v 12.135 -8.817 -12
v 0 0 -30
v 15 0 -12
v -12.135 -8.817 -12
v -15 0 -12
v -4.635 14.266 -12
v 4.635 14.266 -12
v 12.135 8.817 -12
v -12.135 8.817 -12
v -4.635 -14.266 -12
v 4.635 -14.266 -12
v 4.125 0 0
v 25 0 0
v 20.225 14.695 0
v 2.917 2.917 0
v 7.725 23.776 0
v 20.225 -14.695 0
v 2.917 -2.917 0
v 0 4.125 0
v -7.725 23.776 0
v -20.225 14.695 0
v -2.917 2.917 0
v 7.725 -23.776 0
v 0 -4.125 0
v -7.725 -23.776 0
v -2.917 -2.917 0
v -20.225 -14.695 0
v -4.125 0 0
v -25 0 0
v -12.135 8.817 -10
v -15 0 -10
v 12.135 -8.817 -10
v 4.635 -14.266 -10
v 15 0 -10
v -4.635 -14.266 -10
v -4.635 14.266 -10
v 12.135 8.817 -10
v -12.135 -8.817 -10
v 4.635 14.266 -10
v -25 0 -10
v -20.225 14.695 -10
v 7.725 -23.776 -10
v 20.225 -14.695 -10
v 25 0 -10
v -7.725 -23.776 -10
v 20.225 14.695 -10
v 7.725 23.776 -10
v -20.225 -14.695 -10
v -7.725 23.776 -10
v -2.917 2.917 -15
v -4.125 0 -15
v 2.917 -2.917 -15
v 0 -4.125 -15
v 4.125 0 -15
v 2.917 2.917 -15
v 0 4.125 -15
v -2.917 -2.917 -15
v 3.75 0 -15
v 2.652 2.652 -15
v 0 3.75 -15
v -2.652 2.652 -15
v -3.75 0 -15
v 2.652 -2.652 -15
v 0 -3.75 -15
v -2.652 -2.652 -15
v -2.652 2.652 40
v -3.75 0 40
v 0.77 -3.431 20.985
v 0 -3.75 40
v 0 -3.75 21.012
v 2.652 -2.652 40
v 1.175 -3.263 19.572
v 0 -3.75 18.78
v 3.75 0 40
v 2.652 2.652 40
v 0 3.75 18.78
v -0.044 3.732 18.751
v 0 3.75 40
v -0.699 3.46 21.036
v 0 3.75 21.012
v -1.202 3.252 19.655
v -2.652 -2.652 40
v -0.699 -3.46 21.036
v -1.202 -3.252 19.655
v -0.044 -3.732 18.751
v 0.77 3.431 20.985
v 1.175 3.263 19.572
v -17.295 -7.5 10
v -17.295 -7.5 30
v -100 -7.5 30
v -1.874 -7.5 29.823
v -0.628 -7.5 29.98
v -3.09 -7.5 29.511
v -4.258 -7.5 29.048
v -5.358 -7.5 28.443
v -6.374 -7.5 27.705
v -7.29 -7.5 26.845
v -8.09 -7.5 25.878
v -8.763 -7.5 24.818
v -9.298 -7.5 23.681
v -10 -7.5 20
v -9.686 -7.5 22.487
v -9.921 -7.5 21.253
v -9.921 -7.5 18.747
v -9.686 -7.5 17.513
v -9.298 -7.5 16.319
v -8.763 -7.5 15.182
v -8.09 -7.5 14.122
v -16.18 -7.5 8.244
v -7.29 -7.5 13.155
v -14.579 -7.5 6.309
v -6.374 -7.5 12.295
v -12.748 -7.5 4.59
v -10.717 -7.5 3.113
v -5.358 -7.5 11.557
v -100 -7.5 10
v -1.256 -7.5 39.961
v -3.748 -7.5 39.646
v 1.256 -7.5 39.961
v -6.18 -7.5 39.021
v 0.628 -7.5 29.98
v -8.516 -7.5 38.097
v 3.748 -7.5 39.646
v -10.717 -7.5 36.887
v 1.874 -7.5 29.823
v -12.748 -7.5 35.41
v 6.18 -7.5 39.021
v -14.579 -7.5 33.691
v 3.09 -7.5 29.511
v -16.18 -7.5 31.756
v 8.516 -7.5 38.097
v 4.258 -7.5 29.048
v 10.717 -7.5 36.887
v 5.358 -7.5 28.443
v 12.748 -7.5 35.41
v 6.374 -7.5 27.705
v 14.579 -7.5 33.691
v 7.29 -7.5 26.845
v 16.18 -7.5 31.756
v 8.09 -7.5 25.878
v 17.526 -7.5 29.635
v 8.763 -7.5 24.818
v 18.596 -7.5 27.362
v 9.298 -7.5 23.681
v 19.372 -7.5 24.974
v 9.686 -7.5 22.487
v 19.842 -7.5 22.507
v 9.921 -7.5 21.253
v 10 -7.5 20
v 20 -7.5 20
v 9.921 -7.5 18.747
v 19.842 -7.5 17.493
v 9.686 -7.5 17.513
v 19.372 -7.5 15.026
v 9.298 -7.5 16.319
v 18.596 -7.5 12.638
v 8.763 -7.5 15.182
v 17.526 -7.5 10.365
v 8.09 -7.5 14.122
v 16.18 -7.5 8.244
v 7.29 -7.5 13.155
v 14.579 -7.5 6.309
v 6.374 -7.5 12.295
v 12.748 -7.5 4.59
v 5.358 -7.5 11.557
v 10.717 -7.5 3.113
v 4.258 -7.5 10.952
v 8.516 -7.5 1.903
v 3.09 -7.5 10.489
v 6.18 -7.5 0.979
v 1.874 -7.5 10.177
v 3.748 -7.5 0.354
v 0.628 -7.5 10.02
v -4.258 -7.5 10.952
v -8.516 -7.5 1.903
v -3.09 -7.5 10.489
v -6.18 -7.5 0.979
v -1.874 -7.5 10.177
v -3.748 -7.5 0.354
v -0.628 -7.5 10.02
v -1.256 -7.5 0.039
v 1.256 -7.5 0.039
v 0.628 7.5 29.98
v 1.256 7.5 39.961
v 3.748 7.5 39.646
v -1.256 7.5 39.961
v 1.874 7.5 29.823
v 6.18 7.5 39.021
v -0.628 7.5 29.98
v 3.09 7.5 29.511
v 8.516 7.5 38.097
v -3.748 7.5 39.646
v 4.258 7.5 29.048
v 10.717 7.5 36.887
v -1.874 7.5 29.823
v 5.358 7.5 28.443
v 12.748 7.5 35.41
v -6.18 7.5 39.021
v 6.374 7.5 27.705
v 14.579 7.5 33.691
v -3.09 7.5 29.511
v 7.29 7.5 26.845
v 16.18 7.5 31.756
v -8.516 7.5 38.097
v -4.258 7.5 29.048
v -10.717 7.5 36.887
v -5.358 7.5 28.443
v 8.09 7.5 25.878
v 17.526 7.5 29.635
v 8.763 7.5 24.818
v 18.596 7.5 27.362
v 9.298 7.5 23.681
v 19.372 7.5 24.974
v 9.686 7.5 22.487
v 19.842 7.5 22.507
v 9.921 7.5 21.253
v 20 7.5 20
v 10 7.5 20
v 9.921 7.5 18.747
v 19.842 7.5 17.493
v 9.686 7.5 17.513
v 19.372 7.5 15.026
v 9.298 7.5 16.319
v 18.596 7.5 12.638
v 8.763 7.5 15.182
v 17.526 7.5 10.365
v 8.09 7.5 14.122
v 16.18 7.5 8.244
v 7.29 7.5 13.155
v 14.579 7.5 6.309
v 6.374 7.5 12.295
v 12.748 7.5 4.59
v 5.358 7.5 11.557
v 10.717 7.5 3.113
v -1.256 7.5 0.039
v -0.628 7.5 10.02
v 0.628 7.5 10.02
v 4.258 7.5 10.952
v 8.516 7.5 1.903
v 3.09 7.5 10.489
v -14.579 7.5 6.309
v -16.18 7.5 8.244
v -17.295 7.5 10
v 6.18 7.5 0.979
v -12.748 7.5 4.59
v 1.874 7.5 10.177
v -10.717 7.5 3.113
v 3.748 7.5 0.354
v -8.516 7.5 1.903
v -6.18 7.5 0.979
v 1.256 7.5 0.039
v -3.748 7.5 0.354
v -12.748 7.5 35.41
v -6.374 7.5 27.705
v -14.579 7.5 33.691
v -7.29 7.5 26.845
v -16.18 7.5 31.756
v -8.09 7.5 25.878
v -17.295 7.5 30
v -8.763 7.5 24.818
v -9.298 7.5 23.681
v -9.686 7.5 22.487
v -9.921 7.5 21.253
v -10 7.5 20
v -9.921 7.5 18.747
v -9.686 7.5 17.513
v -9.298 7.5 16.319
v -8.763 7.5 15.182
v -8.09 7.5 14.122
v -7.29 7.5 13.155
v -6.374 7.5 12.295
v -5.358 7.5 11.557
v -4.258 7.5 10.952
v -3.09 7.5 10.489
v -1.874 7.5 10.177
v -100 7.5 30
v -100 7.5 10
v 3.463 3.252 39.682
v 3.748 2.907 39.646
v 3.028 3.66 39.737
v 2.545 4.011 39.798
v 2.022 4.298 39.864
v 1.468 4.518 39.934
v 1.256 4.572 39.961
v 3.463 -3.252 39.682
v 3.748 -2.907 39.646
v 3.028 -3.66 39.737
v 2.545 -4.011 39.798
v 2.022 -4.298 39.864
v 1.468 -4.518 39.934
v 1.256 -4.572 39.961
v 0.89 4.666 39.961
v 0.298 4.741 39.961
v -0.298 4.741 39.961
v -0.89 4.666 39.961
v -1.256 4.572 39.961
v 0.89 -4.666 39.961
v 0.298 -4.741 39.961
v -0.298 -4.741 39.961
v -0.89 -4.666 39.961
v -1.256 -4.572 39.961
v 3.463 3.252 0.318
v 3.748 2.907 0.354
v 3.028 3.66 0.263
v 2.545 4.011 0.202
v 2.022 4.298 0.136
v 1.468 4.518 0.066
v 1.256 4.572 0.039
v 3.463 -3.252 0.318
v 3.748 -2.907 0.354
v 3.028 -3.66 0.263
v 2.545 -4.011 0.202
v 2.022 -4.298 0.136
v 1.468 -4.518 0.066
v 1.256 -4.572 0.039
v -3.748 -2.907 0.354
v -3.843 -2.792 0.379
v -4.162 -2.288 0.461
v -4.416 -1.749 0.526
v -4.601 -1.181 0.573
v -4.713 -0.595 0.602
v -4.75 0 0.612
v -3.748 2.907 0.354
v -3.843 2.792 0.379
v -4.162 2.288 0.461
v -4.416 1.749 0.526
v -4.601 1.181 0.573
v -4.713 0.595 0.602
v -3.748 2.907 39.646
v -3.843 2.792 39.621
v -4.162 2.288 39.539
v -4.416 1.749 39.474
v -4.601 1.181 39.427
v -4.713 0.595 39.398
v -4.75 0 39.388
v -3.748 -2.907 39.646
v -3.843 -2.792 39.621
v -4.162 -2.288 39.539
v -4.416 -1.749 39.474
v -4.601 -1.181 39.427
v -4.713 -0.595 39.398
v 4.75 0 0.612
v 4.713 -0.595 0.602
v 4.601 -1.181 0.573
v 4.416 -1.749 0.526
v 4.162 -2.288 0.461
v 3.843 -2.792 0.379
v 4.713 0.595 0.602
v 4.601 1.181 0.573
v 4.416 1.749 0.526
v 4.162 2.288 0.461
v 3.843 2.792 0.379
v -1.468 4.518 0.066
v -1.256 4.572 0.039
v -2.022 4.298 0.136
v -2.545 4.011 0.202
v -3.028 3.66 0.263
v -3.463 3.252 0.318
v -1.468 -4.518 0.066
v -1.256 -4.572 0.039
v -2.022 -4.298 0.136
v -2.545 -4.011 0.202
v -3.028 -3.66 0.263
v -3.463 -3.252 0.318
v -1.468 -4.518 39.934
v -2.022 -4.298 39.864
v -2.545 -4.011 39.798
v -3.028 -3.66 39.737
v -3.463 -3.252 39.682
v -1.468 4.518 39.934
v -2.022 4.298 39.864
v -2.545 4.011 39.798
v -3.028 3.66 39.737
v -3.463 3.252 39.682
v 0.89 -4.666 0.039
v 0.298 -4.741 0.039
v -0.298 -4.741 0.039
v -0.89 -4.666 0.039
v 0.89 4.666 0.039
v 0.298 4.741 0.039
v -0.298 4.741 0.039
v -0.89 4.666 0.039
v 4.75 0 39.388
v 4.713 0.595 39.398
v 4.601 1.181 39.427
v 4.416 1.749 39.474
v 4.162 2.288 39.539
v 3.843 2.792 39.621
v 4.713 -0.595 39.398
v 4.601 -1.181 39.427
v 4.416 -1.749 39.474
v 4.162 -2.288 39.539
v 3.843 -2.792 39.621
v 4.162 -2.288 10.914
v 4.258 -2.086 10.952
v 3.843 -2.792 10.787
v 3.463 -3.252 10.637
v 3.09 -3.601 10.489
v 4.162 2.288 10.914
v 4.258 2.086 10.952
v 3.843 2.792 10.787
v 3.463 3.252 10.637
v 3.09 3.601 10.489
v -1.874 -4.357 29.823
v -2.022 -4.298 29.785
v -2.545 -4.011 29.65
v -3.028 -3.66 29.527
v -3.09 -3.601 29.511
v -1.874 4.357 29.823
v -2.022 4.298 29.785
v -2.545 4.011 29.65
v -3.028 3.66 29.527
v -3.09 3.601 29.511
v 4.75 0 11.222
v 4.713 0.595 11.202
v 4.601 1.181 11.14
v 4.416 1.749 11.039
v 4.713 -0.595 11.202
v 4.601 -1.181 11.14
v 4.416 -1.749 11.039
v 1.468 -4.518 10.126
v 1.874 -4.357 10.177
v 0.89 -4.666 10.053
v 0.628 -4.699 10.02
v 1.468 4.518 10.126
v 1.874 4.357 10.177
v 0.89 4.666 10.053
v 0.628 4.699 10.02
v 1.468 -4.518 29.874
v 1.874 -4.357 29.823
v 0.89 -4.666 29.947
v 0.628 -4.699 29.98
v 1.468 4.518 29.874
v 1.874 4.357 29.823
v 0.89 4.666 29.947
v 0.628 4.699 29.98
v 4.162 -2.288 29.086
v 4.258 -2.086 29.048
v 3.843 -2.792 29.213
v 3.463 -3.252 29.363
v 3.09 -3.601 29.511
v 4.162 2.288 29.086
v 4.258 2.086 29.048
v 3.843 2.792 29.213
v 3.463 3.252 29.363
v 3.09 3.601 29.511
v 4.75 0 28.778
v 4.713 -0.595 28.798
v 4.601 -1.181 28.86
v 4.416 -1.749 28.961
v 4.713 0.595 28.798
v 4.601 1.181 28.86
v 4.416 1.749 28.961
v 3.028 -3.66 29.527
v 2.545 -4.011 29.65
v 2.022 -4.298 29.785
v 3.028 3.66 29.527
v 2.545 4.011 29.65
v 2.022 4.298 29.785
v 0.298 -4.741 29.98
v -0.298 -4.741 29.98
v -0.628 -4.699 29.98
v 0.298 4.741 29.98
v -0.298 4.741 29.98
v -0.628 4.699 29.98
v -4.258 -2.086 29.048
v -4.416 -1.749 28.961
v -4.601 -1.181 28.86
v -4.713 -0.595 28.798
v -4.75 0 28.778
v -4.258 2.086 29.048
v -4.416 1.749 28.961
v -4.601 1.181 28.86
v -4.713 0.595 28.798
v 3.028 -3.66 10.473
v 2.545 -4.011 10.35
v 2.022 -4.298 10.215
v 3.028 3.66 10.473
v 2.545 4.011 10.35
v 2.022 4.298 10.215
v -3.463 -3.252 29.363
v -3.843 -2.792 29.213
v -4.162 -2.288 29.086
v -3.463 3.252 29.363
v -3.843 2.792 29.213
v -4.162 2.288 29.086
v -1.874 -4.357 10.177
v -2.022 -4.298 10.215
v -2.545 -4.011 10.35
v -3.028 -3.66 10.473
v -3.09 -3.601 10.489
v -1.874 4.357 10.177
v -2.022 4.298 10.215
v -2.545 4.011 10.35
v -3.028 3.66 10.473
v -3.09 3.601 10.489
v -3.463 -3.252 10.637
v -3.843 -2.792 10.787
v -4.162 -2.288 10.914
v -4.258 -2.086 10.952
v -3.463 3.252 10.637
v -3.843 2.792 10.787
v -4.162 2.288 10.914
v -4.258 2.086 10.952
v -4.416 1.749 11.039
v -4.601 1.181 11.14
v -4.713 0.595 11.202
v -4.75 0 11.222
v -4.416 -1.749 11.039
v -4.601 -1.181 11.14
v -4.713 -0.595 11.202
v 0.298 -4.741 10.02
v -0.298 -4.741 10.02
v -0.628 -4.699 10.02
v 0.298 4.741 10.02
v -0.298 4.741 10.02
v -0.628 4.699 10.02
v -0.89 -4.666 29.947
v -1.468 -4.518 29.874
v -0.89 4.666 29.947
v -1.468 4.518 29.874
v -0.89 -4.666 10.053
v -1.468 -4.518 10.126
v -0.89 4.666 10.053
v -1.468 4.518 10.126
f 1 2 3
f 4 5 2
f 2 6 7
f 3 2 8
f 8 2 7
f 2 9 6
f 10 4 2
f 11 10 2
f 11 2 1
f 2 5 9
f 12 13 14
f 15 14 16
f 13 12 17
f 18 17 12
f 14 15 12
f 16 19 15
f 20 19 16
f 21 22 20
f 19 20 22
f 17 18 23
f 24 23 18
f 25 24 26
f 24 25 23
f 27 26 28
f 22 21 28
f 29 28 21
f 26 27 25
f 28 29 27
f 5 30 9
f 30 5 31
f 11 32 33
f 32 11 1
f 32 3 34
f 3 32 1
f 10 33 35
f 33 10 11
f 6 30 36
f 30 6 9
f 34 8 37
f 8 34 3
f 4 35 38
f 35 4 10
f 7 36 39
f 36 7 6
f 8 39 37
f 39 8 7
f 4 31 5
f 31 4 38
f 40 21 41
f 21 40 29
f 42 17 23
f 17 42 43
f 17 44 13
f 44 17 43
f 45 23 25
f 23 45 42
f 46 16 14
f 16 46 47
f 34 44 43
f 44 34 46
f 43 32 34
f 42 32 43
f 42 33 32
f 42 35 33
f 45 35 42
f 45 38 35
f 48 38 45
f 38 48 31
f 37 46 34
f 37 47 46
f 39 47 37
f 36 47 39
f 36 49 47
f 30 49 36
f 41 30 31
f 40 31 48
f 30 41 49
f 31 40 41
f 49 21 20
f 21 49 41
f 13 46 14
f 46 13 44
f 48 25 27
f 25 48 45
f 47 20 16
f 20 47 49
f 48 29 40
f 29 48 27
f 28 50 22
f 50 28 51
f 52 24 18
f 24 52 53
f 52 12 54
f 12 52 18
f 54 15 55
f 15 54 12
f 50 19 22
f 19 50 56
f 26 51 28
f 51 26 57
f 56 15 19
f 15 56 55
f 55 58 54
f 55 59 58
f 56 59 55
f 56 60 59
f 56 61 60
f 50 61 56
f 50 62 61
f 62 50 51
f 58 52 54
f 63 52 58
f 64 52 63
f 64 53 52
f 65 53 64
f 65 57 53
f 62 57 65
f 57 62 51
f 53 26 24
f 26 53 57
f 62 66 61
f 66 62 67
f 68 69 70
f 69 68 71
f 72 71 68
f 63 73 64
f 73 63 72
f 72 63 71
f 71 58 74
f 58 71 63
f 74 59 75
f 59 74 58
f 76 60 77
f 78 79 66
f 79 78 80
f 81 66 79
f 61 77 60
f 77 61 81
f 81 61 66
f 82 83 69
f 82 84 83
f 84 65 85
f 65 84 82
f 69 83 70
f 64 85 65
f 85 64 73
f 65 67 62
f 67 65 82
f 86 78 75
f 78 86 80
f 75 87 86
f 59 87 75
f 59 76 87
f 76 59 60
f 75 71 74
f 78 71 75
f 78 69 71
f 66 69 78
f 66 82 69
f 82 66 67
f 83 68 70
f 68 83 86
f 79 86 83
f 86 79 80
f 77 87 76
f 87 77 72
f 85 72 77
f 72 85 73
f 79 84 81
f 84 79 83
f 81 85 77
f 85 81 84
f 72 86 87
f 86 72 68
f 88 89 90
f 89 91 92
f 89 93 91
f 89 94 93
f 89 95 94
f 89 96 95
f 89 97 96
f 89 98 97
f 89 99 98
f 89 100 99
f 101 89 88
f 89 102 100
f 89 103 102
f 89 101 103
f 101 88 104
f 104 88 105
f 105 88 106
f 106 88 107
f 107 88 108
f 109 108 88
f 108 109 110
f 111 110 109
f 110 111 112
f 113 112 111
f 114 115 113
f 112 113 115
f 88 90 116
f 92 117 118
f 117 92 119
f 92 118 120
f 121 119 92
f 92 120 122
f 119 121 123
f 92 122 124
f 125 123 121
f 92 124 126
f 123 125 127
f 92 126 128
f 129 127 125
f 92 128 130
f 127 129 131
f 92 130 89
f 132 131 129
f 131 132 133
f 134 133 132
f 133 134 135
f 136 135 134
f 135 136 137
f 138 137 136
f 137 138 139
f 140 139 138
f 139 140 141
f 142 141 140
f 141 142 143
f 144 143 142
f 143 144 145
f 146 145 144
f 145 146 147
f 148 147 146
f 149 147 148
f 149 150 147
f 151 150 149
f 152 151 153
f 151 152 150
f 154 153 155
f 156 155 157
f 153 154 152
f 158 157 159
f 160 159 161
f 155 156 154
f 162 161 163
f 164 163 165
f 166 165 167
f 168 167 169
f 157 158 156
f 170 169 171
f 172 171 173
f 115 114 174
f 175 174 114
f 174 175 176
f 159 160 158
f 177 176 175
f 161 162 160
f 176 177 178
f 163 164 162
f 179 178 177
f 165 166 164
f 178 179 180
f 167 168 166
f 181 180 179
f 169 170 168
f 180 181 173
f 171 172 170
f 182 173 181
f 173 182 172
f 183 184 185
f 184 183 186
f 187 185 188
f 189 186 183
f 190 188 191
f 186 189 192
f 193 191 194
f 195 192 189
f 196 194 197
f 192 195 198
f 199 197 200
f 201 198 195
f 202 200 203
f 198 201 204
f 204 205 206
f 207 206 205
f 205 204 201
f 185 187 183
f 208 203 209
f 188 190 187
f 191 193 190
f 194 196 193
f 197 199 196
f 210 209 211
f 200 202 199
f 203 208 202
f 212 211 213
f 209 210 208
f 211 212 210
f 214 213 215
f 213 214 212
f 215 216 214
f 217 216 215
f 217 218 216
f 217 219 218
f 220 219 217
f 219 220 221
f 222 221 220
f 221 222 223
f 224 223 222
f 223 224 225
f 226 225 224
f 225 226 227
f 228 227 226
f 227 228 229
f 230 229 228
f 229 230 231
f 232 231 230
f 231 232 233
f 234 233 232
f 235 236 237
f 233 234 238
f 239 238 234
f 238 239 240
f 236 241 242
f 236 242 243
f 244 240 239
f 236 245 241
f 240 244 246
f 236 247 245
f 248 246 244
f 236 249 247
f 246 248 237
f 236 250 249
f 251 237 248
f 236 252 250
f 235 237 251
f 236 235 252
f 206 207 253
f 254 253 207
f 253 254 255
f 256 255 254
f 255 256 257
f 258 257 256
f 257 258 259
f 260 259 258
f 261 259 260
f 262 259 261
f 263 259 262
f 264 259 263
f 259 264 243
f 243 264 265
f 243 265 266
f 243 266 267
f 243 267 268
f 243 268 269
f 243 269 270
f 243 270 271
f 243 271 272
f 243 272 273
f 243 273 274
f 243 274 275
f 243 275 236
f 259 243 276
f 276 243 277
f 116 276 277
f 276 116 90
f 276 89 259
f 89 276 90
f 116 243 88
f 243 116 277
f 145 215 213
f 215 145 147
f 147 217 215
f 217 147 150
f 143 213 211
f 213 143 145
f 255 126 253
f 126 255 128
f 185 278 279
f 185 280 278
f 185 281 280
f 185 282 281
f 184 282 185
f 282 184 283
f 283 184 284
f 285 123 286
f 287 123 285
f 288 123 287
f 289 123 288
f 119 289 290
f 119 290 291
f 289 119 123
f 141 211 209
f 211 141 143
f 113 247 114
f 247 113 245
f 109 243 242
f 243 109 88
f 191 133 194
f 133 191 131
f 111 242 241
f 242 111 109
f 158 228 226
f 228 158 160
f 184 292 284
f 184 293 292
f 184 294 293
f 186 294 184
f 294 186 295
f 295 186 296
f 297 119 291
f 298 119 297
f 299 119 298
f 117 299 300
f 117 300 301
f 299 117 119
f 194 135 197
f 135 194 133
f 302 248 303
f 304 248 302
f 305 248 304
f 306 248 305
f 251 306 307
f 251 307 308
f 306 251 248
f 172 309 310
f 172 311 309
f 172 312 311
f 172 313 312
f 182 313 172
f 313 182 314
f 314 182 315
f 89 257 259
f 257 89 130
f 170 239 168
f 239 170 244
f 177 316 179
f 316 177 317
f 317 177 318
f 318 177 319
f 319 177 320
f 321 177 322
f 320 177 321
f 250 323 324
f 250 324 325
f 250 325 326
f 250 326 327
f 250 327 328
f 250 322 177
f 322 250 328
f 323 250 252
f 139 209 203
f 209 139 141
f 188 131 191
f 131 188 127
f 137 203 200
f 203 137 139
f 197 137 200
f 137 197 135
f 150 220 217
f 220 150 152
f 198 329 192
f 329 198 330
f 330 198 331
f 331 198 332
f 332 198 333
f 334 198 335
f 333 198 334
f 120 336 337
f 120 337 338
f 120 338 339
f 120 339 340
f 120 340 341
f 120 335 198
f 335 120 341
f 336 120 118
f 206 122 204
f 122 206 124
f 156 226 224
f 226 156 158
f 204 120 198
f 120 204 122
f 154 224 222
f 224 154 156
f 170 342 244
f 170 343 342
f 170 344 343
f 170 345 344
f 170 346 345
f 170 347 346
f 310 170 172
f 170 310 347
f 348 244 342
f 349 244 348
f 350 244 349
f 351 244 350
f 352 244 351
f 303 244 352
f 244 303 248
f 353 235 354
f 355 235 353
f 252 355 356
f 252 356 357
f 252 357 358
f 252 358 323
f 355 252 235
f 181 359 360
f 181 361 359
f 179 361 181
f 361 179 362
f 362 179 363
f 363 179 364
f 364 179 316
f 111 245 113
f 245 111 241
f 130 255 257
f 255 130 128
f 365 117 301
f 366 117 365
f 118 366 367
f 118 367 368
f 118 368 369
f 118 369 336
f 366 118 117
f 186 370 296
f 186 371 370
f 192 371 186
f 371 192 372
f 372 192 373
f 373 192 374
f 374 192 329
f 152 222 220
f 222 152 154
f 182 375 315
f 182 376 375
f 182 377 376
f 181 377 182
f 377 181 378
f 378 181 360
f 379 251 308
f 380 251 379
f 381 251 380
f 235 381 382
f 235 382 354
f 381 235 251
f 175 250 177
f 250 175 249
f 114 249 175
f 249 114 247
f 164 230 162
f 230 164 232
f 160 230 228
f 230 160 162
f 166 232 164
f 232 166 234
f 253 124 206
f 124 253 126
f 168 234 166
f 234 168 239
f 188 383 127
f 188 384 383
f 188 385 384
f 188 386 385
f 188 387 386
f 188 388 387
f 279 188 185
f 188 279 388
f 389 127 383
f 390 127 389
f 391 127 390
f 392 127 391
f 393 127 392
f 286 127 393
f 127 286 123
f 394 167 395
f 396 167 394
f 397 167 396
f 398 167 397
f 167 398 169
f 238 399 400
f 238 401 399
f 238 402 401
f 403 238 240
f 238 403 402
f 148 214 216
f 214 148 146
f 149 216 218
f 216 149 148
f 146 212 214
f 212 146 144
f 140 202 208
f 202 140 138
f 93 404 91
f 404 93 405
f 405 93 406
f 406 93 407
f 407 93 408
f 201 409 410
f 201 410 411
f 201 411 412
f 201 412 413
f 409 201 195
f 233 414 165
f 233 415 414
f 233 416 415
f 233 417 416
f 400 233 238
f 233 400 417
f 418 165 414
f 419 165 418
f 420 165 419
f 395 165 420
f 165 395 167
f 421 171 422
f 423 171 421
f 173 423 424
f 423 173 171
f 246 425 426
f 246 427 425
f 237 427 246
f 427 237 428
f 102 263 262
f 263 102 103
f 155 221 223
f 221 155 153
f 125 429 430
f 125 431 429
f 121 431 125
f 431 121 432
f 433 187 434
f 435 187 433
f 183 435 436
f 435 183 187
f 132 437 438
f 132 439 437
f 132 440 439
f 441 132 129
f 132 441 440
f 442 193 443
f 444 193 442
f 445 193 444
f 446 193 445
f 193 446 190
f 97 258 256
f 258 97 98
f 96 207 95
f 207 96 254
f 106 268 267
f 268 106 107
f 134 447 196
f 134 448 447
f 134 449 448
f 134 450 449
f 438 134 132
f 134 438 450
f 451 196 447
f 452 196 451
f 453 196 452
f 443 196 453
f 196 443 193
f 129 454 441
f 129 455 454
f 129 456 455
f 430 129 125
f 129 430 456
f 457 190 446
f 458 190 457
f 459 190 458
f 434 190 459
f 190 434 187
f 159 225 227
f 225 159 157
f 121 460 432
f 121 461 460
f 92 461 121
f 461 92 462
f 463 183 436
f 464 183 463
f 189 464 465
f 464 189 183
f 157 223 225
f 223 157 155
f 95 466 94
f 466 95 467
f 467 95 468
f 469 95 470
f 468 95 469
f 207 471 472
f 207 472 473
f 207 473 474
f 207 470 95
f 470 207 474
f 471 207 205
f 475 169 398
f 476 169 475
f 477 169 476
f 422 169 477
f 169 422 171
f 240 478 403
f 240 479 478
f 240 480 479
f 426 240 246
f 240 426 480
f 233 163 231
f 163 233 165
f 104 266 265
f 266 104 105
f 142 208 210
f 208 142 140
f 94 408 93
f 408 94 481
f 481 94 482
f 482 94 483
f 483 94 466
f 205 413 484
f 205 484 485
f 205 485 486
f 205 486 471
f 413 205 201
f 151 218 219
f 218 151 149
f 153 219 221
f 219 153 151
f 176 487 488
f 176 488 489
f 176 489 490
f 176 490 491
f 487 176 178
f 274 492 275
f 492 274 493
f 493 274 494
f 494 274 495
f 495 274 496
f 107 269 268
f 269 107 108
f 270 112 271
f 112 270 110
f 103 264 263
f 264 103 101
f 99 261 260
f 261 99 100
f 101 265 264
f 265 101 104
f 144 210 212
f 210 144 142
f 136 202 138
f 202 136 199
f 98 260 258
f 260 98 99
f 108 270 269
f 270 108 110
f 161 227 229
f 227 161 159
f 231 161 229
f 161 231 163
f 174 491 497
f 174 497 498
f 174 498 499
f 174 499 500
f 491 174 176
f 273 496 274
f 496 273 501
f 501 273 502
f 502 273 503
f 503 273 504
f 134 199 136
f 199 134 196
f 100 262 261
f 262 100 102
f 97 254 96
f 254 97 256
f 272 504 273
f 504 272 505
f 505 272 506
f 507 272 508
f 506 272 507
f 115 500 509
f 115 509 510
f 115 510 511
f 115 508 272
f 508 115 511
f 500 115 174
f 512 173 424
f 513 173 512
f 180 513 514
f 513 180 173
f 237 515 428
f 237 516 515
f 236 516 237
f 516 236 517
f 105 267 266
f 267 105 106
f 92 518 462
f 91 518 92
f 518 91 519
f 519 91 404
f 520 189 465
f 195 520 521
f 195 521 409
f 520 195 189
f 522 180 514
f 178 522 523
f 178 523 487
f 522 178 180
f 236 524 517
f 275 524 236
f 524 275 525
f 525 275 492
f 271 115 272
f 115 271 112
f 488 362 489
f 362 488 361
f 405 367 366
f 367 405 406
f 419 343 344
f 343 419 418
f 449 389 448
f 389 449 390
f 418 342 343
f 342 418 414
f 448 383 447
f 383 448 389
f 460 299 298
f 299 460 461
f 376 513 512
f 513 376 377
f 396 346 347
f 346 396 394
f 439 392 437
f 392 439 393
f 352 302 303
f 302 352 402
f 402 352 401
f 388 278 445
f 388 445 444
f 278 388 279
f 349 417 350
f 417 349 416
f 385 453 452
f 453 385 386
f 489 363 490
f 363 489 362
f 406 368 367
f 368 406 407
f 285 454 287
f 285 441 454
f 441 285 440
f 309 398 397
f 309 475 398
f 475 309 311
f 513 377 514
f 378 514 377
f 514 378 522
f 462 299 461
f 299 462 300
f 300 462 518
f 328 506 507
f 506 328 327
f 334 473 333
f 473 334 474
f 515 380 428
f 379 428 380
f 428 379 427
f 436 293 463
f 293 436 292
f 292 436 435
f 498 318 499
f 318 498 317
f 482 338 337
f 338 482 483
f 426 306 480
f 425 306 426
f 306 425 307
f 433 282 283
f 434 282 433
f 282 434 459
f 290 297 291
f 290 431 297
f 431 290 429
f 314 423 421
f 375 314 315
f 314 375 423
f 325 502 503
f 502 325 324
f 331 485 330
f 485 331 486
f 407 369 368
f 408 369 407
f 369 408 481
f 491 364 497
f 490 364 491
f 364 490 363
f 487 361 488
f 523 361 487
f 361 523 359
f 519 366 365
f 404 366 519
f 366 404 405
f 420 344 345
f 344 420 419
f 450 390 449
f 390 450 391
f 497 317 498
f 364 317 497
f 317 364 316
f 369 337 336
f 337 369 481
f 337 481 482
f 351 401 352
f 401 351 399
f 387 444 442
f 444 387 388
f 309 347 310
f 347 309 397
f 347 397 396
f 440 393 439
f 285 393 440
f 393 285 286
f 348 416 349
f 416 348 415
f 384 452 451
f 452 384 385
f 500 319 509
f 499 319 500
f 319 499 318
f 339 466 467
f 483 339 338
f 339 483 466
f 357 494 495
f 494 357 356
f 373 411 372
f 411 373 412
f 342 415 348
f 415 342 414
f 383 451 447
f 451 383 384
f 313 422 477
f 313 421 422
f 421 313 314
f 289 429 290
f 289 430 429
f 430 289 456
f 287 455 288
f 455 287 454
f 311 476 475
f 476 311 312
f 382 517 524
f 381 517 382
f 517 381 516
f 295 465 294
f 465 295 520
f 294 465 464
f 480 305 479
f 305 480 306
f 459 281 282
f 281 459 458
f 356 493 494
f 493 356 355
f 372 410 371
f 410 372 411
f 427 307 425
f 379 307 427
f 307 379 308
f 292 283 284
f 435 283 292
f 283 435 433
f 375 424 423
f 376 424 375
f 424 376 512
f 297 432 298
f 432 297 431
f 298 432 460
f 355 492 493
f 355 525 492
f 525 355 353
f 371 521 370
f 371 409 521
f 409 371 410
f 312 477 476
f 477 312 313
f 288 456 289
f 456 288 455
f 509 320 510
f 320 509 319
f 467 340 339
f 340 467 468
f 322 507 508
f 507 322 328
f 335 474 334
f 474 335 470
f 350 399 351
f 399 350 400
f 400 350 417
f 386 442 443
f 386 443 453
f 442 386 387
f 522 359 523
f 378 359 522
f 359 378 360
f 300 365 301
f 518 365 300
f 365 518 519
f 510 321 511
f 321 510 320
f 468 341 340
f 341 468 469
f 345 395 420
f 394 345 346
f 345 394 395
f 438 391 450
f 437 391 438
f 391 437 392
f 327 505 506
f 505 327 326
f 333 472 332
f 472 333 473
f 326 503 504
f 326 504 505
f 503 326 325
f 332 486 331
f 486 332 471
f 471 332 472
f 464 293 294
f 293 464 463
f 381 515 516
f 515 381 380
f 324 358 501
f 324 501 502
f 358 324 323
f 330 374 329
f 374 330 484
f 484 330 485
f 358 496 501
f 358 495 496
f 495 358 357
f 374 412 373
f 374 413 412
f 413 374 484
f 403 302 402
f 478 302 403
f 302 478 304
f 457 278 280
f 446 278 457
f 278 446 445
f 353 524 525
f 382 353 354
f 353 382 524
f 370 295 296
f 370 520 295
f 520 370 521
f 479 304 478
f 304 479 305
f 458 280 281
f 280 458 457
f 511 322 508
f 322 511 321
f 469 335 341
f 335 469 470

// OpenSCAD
/*[top dimensions]*/
//Show assembled
assembled=1; //[1:yes, 0:no]
stem_height=40;
stem_dia=7.5;
stem_dia_tol=.75;
stem_facets=8;
stem_hole_dia=2.5;
stem_hole_offset=stem_height/2;

base_height=30;
base_dia=50;
base_facets=10;
base_chamfer=10;
base_ring_dia=50;
base_ring_height=10;

/*[handle dimensions]*/
handle_length=100;
handle_thick=stem_dia*2;
handle_width=20;
hole_edge=10;
shaft_tol=1;


top();
if(assembled==0)
translate([0,handle_width+base_dia/2+base_ring_dia/2,0])
handle();
if(assembled==1)
translate([-handle_length/2,0,stem_height/2])
	rotate([90,0,0])
		handle();


module top(){
	if (assembled==1){
		union(){
			rotate([180,0,0])
				base();
			translate([0,0,stem_height])
				rotate([180,0,0])
					stem();
		}
	}
	if(assembled==0){
		base();
		translate([base_ring_dia/2+base_dia/2+stem_dia,0,0])
			stem();

	}

}

module handle(){
	difference(){
		union(){
			cube([handle_length,handle_width,handle_thick],center=true);
			translate([handle_length/2,0,0])
				cylinder(r=stem_height/2,h=handle_thick,$fn=50,center=true);
		}
		translate([handle_length/2,0,0])
			cylinder(r=stem_height/2-hole_edge,h=handle_thick*1.1,$fn=50,center=true);
		translate([handle_length/2,0,0])
			rotate([90,0,0])
				cylinder(r=stem_dia/2+shaft_tol,h=stem_height*1.1,center=true,$fn=50);
		//for(i=[-handle_length/2
	}
}

module base(){
	difference(){
		union(){
			intersection(){
				cylinder(r1=base_dia/2,r2=0,h=base_height,$fn=base_facets);
				cylinder(r=base_dia/2-base_chamfer,h=base_height,$fn=base_facets);
			}
			cylinder(r=base_ring_dia/2,h=base_ring_height,$fn=base_facets);
		}
		cylinder(r=stem_dia/2+stem_dia_tol/2,h=base_height/2,$fn=stem_facets);
	}
	
}

module stem(){
	difference(){
		cylinder(r=stem_dia/2,h=stem_height+base_height/2,$fn=stem_facets);
		translate([0,0,stem_hole_offset])
			rotate([90,-20,0])
				cylinder(r=stem_hole_dia/2,h=stem_dia*1.5,$fn=5,center=true);
	}


}
